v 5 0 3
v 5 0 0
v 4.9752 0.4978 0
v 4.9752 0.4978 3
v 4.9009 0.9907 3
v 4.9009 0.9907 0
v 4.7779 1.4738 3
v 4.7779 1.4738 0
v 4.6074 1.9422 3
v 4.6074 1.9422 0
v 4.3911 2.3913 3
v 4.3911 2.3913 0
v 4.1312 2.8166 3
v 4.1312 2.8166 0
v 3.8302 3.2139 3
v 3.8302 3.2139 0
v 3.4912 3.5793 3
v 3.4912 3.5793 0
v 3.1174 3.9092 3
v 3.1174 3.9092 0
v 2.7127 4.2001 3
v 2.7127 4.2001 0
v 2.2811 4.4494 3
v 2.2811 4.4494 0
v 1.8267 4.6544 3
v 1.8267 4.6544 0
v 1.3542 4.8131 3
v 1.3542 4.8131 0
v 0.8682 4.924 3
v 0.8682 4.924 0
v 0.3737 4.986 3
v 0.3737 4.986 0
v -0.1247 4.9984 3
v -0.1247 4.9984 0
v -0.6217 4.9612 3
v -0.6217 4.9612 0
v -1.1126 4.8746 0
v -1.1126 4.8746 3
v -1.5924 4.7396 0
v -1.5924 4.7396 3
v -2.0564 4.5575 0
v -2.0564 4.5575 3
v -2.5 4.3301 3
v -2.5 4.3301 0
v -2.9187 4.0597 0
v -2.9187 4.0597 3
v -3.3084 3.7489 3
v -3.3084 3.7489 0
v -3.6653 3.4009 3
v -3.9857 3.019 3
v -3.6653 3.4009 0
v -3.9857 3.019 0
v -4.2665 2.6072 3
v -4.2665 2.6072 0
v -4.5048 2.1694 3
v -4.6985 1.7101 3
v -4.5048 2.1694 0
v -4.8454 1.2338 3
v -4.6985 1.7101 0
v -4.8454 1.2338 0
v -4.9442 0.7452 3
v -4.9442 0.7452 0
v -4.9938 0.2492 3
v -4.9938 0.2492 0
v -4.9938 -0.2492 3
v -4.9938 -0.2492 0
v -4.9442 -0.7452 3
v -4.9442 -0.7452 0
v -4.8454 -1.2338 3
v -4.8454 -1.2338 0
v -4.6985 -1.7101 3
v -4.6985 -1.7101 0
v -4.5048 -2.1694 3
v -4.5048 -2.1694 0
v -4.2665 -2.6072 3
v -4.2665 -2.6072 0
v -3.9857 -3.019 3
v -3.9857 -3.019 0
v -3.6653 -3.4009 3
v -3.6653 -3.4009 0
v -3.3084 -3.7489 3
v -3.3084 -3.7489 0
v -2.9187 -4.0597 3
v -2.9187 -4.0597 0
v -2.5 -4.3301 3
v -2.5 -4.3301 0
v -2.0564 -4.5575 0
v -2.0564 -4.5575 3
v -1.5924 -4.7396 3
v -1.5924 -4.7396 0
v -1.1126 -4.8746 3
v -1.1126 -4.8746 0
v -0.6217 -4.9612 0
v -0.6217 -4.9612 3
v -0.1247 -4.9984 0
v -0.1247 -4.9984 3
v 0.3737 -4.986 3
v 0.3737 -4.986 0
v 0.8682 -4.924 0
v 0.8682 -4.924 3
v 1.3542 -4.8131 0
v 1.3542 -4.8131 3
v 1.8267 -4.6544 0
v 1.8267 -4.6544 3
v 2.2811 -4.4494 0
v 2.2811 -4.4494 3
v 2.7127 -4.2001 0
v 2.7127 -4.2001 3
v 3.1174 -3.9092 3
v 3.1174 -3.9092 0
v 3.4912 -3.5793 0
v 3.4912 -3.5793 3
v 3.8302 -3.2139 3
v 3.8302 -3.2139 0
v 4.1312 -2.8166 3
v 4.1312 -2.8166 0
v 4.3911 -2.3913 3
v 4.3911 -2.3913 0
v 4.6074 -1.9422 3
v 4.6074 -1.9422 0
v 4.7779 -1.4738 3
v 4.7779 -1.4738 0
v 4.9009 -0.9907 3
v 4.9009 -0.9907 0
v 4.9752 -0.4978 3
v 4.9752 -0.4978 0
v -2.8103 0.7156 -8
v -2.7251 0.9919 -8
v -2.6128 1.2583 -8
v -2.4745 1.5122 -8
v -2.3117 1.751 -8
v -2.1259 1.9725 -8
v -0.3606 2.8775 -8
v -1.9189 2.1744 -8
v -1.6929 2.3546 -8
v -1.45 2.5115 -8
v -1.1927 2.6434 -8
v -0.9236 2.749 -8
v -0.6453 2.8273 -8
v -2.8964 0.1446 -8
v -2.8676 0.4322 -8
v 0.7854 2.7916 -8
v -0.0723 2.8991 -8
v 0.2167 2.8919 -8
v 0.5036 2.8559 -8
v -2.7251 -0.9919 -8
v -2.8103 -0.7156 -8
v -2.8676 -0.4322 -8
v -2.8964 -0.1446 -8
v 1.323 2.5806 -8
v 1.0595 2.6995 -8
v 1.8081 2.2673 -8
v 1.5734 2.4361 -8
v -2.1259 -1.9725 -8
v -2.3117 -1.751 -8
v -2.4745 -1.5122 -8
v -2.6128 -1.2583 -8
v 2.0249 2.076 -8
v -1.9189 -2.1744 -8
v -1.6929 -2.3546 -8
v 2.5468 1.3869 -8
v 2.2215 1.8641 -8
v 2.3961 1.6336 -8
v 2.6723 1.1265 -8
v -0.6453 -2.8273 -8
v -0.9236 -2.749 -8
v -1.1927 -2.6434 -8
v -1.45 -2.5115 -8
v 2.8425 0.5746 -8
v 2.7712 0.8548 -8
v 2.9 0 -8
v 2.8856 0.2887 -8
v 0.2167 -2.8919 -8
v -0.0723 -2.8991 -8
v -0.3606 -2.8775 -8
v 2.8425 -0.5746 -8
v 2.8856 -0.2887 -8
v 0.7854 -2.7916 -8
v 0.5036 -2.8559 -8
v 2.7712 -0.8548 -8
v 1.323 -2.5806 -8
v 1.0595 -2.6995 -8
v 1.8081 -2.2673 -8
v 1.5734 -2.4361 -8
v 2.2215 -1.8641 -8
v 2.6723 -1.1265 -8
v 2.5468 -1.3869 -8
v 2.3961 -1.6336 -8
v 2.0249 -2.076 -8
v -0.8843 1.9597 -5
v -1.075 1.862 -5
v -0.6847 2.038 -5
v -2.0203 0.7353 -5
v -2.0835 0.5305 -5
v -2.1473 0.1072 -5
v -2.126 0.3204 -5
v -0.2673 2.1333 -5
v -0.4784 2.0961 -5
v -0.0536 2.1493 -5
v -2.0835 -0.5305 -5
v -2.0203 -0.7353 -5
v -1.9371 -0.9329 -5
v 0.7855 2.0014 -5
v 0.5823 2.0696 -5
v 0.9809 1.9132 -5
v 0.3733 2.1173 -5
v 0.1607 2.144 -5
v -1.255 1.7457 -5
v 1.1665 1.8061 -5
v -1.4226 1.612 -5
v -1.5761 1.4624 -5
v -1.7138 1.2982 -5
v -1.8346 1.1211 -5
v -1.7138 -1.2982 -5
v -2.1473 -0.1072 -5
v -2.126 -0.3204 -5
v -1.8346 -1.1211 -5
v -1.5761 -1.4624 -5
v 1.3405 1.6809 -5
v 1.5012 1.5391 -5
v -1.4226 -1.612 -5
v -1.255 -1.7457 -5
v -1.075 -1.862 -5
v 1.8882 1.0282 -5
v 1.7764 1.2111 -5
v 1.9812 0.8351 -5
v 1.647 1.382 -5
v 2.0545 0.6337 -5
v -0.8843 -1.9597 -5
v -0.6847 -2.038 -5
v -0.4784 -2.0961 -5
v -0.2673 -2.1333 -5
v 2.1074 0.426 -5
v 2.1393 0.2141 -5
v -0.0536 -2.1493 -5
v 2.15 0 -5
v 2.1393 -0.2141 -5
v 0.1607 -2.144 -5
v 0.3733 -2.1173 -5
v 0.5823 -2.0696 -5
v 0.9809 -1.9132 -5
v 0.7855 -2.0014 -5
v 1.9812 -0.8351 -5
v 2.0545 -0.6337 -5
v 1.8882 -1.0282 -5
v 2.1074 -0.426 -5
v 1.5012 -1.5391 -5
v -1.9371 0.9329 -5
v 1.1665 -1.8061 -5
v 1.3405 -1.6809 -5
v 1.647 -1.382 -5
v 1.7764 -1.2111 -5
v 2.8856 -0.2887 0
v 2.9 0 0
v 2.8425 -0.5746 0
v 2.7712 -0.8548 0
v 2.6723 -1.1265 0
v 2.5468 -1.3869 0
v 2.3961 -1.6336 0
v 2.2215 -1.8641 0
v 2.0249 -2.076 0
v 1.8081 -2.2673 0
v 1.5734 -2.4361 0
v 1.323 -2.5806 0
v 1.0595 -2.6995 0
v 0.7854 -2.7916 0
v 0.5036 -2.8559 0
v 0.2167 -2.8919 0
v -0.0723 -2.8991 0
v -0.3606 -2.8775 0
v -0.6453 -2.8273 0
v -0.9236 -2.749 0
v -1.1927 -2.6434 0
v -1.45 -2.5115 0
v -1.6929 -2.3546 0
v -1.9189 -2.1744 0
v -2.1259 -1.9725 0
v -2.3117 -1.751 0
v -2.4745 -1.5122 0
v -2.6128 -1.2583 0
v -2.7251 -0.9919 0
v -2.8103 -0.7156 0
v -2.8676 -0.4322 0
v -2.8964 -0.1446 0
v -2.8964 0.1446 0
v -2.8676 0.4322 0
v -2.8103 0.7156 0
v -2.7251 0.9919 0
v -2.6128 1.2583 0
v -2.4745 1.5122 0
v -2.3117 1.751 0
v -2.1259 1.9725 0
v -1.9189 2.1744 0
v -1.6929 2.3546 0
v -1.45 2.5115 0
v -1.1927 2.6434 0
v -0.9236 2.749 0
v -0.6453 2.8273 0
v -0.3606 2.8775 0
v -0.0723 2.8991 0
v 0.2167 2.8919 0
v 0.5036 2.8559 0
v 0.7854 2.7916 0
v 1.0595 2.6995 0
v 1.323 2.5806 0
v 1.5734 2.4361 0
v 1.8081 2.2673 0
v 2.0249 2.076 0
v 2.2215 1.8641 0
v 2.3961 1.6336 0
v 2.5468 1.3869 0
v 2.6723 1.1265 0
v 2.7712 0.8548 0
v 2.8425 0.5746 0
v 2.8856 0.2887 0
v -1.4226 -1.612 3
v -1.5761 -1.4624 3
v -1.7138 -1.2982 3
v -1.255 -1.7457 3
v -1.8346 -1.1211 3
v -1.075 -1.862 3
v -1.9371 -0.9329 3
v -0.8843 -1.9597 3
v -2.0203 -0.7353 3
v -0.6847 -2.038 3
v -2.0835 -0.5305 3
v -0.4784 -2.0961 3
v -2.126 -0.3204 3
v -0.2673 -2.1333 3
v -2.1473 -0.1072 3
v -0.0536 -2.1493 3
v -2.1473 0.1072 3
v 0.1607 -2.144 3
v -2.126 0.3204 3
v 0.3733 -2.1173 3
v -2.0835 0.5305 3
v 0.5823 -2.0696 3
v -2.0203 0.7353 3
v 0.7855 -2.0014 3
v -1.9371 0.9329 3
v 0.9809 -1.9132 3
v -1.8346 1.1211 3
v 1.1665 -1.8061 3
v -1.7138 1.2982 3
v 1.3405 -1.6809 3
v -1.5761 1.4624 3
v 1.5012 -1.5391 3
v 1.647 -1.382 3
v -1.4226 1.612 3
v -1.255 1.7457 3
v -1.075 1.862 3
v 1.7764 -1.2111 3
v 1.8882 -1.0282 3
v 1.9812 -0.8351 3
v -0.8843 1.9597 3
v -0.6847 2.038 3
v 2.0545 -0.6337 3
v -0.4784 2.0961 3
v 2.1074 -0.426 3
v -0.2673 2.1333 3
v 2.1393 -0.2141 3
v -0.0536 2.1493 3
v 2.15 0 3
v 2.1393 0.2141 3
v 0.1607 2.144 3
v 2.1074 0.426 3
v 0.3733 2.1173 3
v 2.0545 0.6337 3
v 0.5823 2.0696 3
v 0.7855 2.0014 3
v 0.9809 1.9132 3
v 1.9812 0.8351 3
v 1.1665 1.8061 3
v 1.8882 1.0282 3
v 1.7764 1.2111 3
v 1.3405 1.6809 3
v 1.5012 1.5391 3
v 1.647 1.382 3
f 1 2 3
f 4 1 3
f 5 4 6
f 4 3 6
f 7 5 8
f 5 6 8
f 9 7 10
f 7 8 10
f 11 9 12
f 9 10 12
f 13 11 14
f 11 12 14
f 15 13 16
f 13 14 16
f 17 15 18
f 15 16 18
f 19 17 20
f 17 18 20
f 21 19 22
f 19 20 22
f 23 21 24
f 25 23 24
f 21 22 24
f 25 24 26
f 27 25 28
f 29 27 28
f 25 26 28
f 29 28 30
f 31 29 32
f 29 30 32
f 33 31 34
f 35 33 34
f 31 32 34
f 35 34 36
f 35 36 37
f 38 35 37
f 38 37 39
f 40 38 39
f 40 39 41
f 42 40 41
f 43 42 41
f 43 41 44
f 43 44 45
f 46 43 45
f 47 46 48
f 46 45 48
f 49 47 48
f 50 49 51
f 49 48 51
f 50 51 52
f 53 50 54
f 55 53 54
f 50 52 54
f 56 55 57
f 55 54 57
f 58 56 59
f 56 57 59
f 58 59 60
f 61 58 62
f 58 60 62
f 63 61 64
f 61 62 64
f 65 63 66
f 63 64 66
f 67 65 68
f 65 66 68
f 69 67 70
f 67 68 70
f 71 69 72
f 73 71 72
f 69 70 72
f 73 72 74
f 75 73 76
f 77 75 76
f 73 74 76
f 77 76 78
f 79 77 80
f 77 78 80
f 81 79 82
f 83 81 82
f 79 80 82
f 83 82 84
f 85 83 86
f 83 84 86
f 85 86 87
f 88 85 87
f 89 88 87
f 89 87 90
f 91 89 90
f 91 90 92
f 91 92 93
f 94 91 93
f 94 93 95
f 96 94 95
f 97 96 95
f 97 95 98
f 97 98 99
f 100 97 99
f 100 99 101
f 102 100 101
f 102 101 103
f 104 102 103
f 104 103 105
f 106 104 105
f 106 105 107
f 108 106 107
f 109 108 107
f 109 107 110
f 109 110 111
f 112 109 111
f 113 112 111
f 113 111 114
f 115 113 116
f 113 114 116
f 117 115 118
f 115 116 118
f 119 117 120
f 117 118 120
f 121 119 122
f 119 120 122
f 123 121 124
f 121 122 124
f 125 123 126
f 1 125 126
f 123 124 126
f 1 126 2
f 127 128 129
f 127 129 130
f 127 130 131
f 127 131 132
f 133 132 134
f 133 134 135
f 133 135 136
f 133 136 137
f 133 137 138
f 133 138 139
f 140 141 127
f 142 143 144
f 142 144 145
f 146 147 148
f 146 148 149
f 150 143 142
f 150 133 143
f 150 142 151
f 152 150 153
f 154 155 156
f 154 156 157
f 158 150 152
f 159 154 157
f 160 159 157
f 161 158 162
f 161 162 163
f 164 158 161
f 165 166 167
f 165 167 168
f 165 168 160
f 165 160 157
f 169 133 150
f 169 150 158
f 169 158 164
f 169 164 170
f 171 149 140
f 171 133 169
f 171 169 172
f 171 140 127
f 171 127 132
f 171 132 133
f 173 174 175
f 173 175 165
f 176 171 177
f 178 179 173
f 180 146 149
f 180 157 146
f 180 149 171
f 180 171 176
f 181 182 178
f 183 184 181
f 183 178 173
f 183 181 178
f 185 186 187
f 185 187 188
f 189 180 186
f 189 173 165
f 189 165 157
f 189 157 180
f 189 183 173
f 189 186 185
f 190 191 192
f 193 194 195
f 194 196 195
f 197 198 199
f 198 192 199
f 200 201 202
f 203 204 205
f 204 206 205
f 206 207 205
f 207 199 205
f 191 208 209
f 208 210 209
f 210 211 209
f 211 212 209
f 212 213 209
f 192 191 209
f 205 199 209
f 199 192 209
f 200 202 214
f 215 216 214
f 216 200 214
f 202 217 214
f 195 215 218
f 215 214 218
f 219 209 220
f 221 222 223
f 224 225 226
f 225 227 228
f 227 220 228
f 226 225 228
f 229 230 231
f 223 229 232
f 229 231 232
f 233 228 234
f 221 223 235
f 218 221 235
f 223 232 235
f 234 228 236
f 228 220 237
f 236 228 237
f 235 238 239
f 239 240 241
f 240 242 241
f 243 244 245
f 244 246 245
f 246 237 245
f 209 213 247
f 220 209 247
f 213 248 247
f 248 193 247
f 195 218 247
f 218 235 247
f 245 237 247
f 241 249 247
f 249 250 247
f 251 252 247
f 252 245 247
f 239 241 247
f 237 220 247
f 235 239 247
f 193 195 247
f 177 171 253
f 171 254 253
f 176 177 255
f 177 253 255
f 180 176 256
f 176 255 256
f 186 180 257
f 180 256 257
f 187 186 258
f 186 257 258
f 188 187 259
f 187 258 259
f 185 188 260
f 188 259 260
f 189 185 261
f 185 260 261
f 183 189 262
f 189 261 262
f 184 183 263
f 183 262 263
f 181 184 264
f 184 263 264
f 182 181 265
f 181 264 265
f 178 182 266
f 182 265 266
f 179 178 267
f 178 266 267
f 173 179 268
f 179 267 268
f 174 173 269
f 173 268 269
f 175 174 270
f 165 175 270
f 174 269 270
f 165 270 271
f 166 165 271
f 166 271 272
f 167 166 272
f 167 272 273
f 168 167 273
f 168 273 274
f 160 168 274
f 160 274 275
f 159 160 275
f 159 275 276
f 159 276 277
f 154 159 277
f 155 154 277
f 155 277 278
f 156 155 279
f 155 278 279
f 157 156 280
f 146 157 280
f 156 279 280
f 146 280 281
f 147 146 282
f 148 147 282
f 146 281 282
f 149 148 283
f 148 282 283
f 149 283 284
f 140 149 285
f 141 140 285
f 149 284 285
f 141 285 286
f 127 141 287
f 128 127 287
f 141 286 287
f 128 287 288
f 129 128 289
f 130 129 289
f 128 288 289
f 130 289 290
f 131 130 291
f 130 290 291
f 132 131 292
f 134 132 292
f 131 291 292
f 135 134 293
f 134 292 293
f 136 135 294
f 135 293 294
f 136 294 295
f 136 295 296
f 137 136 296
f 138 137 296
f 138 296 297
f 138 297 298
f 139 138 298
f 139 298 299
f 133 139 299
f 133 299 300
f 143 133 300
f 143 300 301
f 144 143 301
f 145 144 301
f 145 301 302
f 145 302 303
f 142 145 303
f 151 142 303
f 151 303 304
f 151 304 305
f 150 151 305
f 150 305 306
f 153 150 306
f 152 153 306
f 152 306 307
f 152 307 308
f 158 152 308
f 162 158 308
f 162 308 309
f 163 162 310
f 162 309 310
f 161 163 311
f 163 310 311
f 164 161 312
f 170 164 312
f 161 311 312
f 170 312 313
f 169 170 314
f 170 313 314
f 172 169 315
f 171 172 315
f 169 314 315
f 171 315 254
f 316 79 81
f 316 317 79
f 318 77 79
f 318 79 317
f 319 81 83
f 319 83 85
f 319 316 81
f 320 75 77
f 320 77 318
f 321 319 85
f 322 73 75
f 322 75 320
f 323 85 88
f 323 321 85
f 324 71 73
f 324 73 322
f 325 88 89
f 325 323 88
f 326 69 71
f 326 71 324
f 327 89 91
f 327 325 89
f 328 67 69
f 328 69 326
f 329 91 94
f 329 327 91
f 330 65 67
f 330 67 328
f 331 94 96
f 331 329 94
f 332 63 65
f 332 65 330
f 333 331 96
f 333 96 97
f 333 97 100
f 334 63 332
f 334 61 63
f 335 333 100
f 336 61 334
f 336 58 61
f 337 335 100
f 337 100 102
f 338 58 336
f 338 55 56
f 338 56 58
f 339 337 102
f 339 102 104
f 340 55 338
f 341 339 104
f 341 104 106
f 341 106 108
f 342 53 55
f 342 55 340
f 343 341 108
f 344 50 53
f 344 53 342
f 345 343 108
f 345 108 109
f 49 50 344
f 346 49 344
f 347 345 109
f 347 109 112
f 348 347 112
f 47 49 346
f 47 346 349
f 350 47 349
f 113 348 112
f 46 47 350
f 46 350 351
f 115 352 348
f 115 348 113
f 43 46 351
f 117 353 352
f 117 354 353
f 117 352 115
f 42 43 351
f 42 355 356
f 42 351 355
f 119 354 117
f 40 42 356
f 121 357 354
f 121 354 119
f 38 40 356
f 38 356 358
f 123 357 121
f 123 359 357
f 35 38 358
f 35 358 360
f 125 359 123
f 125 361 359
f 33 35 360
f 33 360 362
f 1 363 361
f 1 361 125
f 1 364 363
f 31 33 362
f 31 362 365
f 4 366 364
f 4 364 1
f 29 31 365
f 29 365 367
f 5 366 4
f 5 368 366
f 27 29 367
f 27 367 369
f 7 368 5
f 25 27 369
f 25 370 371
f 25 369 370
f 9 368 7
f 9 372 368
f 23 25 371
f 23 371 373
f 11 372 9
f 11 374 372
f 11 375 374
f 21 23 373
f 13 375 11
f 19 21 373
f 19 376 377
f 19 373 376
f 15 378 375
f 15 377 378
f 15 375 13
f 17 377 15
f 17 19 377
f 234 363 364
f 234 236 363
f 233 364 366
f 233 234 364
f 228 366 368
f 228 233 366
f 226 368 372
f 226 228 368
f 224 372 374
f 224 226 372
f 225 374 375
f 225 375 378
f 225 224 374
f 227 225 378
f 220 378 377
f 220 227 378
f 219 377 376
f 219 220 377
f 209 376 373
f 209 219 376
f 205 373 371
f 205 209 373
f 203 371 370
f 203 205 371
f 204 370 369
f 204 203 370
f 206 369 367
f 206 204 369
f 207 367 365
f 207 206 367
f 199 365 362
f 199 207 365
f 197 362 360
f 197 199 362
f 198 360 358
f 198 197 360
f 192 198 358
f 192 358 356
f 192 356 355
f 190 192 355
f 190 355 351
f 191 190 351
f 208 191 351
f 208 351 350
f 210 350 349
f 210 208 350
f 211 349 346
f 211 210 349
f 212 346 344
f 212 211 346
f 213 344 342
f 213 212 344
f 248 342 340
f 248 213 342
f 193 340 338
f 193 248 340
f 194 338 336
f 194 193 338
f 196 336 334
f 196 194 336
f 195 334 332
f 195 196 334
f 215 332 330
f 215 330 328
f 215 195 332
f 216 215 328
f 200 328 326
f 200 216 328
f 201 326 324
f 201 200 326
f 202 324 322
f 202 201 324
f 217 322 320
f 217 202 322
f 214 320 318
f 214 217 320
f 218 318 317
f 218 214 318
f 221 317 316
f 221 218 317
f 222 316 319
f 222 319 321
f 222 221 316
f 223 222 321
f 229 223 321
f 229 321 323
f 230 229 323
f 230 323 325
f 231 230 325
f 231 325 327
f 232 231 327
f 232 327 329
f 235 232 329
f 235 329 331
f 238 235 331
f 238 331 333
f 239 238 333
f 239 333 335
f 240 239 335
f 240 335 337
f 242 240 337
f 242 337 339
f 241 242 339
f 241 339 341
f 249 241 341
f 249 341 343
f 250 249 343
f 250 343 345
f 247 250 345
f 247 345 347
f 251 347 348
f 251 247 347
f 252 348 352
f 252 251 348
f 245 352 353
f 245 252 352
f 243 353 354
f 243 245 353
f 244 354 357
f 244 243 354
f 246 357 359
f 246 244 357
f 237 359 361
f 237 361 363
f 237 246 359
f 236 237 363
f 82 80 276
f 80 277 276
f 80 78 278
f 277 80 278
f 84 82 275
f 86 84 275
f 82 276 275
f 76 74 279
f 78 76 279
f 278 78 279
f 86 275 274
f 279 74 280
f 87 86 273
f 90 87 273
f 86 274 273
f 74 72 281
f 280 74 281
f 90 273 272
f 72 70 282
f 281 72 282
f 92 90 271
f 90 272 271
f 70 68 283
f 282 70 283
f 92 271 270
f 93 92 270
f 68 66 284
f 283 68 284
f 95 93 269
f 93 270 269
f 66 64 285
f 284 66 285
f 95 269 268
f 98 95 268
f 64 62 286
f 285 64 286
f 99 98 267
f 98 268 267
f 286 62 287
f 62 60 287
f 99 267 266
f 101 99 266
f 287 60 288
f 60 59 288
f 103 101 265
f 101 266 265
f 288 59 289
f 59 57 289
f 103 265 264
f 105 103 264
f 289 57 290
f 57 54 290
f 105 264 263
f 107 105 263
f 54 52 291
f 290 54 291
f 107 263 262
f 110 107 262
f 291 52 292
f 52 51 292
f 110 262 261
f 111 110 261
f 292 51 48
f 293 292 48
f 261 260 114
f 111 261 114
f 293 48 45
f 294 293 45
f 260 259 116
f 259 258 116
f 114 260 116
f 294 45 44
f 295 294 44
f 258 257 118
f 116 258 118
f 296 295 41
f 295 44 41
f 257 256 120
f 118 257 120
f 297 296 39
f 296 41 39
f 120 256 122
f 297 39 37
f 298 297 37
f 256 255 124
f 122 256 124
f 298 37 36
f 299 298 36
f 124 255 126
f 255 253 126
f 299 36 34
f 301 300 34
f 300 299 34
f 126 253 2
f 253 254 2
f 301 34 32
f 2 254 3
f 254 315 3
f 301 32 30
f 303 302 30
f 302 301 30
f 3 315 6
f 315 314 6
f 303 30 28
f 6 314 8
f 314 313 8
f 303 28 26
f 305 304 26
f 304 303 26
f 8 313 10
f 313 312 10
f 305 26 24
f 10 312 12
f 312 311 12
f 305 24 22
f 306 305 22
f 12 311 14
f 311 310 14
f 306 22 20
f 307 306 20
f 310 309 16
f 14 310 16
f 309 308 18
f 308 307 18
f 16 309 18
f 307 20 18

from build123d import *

# Parameters (mm, degrees)
F0_R     = 5
F0_R_2   = 2.9
F0_R_3   = 2.15
F1_DEPTH = 3
F2_DEPTH = 5
F3_R     = 2.9
F4_DEPTH = 3


with BuildPart() as f1:
    # F0 (on Top) → F1 (new body)
    with BuildSketch(Plane.XY):
        Circle(F0_R)
        Circle(F0_R_2, mode=Mode.SUBTRACT)
        Circle(F0_R_2)
        Circle(F0_R_3, mode=Mode.SUBTRACT)
    extrude(amount=F1_DEPTH)

    # F0 (on Top) → F2 (join)
    with BuildSketch(Plane.XY):
        Circle(F0_R_2)
        Circle(F0_R_3, mode=Mode.SUBTRACT)
    extrude(amount=-F2_DEPTH)

    # F3 (on face) → F4 (join)
    with BuildSketch(Plane(origin=(0, 0, -5), x_dir=(1, 0, 0), z_dir=(0, 0, -1))):
        Circle(F3_R)
    extrude(amount=F4_DEPTH)


solid = f1.part
